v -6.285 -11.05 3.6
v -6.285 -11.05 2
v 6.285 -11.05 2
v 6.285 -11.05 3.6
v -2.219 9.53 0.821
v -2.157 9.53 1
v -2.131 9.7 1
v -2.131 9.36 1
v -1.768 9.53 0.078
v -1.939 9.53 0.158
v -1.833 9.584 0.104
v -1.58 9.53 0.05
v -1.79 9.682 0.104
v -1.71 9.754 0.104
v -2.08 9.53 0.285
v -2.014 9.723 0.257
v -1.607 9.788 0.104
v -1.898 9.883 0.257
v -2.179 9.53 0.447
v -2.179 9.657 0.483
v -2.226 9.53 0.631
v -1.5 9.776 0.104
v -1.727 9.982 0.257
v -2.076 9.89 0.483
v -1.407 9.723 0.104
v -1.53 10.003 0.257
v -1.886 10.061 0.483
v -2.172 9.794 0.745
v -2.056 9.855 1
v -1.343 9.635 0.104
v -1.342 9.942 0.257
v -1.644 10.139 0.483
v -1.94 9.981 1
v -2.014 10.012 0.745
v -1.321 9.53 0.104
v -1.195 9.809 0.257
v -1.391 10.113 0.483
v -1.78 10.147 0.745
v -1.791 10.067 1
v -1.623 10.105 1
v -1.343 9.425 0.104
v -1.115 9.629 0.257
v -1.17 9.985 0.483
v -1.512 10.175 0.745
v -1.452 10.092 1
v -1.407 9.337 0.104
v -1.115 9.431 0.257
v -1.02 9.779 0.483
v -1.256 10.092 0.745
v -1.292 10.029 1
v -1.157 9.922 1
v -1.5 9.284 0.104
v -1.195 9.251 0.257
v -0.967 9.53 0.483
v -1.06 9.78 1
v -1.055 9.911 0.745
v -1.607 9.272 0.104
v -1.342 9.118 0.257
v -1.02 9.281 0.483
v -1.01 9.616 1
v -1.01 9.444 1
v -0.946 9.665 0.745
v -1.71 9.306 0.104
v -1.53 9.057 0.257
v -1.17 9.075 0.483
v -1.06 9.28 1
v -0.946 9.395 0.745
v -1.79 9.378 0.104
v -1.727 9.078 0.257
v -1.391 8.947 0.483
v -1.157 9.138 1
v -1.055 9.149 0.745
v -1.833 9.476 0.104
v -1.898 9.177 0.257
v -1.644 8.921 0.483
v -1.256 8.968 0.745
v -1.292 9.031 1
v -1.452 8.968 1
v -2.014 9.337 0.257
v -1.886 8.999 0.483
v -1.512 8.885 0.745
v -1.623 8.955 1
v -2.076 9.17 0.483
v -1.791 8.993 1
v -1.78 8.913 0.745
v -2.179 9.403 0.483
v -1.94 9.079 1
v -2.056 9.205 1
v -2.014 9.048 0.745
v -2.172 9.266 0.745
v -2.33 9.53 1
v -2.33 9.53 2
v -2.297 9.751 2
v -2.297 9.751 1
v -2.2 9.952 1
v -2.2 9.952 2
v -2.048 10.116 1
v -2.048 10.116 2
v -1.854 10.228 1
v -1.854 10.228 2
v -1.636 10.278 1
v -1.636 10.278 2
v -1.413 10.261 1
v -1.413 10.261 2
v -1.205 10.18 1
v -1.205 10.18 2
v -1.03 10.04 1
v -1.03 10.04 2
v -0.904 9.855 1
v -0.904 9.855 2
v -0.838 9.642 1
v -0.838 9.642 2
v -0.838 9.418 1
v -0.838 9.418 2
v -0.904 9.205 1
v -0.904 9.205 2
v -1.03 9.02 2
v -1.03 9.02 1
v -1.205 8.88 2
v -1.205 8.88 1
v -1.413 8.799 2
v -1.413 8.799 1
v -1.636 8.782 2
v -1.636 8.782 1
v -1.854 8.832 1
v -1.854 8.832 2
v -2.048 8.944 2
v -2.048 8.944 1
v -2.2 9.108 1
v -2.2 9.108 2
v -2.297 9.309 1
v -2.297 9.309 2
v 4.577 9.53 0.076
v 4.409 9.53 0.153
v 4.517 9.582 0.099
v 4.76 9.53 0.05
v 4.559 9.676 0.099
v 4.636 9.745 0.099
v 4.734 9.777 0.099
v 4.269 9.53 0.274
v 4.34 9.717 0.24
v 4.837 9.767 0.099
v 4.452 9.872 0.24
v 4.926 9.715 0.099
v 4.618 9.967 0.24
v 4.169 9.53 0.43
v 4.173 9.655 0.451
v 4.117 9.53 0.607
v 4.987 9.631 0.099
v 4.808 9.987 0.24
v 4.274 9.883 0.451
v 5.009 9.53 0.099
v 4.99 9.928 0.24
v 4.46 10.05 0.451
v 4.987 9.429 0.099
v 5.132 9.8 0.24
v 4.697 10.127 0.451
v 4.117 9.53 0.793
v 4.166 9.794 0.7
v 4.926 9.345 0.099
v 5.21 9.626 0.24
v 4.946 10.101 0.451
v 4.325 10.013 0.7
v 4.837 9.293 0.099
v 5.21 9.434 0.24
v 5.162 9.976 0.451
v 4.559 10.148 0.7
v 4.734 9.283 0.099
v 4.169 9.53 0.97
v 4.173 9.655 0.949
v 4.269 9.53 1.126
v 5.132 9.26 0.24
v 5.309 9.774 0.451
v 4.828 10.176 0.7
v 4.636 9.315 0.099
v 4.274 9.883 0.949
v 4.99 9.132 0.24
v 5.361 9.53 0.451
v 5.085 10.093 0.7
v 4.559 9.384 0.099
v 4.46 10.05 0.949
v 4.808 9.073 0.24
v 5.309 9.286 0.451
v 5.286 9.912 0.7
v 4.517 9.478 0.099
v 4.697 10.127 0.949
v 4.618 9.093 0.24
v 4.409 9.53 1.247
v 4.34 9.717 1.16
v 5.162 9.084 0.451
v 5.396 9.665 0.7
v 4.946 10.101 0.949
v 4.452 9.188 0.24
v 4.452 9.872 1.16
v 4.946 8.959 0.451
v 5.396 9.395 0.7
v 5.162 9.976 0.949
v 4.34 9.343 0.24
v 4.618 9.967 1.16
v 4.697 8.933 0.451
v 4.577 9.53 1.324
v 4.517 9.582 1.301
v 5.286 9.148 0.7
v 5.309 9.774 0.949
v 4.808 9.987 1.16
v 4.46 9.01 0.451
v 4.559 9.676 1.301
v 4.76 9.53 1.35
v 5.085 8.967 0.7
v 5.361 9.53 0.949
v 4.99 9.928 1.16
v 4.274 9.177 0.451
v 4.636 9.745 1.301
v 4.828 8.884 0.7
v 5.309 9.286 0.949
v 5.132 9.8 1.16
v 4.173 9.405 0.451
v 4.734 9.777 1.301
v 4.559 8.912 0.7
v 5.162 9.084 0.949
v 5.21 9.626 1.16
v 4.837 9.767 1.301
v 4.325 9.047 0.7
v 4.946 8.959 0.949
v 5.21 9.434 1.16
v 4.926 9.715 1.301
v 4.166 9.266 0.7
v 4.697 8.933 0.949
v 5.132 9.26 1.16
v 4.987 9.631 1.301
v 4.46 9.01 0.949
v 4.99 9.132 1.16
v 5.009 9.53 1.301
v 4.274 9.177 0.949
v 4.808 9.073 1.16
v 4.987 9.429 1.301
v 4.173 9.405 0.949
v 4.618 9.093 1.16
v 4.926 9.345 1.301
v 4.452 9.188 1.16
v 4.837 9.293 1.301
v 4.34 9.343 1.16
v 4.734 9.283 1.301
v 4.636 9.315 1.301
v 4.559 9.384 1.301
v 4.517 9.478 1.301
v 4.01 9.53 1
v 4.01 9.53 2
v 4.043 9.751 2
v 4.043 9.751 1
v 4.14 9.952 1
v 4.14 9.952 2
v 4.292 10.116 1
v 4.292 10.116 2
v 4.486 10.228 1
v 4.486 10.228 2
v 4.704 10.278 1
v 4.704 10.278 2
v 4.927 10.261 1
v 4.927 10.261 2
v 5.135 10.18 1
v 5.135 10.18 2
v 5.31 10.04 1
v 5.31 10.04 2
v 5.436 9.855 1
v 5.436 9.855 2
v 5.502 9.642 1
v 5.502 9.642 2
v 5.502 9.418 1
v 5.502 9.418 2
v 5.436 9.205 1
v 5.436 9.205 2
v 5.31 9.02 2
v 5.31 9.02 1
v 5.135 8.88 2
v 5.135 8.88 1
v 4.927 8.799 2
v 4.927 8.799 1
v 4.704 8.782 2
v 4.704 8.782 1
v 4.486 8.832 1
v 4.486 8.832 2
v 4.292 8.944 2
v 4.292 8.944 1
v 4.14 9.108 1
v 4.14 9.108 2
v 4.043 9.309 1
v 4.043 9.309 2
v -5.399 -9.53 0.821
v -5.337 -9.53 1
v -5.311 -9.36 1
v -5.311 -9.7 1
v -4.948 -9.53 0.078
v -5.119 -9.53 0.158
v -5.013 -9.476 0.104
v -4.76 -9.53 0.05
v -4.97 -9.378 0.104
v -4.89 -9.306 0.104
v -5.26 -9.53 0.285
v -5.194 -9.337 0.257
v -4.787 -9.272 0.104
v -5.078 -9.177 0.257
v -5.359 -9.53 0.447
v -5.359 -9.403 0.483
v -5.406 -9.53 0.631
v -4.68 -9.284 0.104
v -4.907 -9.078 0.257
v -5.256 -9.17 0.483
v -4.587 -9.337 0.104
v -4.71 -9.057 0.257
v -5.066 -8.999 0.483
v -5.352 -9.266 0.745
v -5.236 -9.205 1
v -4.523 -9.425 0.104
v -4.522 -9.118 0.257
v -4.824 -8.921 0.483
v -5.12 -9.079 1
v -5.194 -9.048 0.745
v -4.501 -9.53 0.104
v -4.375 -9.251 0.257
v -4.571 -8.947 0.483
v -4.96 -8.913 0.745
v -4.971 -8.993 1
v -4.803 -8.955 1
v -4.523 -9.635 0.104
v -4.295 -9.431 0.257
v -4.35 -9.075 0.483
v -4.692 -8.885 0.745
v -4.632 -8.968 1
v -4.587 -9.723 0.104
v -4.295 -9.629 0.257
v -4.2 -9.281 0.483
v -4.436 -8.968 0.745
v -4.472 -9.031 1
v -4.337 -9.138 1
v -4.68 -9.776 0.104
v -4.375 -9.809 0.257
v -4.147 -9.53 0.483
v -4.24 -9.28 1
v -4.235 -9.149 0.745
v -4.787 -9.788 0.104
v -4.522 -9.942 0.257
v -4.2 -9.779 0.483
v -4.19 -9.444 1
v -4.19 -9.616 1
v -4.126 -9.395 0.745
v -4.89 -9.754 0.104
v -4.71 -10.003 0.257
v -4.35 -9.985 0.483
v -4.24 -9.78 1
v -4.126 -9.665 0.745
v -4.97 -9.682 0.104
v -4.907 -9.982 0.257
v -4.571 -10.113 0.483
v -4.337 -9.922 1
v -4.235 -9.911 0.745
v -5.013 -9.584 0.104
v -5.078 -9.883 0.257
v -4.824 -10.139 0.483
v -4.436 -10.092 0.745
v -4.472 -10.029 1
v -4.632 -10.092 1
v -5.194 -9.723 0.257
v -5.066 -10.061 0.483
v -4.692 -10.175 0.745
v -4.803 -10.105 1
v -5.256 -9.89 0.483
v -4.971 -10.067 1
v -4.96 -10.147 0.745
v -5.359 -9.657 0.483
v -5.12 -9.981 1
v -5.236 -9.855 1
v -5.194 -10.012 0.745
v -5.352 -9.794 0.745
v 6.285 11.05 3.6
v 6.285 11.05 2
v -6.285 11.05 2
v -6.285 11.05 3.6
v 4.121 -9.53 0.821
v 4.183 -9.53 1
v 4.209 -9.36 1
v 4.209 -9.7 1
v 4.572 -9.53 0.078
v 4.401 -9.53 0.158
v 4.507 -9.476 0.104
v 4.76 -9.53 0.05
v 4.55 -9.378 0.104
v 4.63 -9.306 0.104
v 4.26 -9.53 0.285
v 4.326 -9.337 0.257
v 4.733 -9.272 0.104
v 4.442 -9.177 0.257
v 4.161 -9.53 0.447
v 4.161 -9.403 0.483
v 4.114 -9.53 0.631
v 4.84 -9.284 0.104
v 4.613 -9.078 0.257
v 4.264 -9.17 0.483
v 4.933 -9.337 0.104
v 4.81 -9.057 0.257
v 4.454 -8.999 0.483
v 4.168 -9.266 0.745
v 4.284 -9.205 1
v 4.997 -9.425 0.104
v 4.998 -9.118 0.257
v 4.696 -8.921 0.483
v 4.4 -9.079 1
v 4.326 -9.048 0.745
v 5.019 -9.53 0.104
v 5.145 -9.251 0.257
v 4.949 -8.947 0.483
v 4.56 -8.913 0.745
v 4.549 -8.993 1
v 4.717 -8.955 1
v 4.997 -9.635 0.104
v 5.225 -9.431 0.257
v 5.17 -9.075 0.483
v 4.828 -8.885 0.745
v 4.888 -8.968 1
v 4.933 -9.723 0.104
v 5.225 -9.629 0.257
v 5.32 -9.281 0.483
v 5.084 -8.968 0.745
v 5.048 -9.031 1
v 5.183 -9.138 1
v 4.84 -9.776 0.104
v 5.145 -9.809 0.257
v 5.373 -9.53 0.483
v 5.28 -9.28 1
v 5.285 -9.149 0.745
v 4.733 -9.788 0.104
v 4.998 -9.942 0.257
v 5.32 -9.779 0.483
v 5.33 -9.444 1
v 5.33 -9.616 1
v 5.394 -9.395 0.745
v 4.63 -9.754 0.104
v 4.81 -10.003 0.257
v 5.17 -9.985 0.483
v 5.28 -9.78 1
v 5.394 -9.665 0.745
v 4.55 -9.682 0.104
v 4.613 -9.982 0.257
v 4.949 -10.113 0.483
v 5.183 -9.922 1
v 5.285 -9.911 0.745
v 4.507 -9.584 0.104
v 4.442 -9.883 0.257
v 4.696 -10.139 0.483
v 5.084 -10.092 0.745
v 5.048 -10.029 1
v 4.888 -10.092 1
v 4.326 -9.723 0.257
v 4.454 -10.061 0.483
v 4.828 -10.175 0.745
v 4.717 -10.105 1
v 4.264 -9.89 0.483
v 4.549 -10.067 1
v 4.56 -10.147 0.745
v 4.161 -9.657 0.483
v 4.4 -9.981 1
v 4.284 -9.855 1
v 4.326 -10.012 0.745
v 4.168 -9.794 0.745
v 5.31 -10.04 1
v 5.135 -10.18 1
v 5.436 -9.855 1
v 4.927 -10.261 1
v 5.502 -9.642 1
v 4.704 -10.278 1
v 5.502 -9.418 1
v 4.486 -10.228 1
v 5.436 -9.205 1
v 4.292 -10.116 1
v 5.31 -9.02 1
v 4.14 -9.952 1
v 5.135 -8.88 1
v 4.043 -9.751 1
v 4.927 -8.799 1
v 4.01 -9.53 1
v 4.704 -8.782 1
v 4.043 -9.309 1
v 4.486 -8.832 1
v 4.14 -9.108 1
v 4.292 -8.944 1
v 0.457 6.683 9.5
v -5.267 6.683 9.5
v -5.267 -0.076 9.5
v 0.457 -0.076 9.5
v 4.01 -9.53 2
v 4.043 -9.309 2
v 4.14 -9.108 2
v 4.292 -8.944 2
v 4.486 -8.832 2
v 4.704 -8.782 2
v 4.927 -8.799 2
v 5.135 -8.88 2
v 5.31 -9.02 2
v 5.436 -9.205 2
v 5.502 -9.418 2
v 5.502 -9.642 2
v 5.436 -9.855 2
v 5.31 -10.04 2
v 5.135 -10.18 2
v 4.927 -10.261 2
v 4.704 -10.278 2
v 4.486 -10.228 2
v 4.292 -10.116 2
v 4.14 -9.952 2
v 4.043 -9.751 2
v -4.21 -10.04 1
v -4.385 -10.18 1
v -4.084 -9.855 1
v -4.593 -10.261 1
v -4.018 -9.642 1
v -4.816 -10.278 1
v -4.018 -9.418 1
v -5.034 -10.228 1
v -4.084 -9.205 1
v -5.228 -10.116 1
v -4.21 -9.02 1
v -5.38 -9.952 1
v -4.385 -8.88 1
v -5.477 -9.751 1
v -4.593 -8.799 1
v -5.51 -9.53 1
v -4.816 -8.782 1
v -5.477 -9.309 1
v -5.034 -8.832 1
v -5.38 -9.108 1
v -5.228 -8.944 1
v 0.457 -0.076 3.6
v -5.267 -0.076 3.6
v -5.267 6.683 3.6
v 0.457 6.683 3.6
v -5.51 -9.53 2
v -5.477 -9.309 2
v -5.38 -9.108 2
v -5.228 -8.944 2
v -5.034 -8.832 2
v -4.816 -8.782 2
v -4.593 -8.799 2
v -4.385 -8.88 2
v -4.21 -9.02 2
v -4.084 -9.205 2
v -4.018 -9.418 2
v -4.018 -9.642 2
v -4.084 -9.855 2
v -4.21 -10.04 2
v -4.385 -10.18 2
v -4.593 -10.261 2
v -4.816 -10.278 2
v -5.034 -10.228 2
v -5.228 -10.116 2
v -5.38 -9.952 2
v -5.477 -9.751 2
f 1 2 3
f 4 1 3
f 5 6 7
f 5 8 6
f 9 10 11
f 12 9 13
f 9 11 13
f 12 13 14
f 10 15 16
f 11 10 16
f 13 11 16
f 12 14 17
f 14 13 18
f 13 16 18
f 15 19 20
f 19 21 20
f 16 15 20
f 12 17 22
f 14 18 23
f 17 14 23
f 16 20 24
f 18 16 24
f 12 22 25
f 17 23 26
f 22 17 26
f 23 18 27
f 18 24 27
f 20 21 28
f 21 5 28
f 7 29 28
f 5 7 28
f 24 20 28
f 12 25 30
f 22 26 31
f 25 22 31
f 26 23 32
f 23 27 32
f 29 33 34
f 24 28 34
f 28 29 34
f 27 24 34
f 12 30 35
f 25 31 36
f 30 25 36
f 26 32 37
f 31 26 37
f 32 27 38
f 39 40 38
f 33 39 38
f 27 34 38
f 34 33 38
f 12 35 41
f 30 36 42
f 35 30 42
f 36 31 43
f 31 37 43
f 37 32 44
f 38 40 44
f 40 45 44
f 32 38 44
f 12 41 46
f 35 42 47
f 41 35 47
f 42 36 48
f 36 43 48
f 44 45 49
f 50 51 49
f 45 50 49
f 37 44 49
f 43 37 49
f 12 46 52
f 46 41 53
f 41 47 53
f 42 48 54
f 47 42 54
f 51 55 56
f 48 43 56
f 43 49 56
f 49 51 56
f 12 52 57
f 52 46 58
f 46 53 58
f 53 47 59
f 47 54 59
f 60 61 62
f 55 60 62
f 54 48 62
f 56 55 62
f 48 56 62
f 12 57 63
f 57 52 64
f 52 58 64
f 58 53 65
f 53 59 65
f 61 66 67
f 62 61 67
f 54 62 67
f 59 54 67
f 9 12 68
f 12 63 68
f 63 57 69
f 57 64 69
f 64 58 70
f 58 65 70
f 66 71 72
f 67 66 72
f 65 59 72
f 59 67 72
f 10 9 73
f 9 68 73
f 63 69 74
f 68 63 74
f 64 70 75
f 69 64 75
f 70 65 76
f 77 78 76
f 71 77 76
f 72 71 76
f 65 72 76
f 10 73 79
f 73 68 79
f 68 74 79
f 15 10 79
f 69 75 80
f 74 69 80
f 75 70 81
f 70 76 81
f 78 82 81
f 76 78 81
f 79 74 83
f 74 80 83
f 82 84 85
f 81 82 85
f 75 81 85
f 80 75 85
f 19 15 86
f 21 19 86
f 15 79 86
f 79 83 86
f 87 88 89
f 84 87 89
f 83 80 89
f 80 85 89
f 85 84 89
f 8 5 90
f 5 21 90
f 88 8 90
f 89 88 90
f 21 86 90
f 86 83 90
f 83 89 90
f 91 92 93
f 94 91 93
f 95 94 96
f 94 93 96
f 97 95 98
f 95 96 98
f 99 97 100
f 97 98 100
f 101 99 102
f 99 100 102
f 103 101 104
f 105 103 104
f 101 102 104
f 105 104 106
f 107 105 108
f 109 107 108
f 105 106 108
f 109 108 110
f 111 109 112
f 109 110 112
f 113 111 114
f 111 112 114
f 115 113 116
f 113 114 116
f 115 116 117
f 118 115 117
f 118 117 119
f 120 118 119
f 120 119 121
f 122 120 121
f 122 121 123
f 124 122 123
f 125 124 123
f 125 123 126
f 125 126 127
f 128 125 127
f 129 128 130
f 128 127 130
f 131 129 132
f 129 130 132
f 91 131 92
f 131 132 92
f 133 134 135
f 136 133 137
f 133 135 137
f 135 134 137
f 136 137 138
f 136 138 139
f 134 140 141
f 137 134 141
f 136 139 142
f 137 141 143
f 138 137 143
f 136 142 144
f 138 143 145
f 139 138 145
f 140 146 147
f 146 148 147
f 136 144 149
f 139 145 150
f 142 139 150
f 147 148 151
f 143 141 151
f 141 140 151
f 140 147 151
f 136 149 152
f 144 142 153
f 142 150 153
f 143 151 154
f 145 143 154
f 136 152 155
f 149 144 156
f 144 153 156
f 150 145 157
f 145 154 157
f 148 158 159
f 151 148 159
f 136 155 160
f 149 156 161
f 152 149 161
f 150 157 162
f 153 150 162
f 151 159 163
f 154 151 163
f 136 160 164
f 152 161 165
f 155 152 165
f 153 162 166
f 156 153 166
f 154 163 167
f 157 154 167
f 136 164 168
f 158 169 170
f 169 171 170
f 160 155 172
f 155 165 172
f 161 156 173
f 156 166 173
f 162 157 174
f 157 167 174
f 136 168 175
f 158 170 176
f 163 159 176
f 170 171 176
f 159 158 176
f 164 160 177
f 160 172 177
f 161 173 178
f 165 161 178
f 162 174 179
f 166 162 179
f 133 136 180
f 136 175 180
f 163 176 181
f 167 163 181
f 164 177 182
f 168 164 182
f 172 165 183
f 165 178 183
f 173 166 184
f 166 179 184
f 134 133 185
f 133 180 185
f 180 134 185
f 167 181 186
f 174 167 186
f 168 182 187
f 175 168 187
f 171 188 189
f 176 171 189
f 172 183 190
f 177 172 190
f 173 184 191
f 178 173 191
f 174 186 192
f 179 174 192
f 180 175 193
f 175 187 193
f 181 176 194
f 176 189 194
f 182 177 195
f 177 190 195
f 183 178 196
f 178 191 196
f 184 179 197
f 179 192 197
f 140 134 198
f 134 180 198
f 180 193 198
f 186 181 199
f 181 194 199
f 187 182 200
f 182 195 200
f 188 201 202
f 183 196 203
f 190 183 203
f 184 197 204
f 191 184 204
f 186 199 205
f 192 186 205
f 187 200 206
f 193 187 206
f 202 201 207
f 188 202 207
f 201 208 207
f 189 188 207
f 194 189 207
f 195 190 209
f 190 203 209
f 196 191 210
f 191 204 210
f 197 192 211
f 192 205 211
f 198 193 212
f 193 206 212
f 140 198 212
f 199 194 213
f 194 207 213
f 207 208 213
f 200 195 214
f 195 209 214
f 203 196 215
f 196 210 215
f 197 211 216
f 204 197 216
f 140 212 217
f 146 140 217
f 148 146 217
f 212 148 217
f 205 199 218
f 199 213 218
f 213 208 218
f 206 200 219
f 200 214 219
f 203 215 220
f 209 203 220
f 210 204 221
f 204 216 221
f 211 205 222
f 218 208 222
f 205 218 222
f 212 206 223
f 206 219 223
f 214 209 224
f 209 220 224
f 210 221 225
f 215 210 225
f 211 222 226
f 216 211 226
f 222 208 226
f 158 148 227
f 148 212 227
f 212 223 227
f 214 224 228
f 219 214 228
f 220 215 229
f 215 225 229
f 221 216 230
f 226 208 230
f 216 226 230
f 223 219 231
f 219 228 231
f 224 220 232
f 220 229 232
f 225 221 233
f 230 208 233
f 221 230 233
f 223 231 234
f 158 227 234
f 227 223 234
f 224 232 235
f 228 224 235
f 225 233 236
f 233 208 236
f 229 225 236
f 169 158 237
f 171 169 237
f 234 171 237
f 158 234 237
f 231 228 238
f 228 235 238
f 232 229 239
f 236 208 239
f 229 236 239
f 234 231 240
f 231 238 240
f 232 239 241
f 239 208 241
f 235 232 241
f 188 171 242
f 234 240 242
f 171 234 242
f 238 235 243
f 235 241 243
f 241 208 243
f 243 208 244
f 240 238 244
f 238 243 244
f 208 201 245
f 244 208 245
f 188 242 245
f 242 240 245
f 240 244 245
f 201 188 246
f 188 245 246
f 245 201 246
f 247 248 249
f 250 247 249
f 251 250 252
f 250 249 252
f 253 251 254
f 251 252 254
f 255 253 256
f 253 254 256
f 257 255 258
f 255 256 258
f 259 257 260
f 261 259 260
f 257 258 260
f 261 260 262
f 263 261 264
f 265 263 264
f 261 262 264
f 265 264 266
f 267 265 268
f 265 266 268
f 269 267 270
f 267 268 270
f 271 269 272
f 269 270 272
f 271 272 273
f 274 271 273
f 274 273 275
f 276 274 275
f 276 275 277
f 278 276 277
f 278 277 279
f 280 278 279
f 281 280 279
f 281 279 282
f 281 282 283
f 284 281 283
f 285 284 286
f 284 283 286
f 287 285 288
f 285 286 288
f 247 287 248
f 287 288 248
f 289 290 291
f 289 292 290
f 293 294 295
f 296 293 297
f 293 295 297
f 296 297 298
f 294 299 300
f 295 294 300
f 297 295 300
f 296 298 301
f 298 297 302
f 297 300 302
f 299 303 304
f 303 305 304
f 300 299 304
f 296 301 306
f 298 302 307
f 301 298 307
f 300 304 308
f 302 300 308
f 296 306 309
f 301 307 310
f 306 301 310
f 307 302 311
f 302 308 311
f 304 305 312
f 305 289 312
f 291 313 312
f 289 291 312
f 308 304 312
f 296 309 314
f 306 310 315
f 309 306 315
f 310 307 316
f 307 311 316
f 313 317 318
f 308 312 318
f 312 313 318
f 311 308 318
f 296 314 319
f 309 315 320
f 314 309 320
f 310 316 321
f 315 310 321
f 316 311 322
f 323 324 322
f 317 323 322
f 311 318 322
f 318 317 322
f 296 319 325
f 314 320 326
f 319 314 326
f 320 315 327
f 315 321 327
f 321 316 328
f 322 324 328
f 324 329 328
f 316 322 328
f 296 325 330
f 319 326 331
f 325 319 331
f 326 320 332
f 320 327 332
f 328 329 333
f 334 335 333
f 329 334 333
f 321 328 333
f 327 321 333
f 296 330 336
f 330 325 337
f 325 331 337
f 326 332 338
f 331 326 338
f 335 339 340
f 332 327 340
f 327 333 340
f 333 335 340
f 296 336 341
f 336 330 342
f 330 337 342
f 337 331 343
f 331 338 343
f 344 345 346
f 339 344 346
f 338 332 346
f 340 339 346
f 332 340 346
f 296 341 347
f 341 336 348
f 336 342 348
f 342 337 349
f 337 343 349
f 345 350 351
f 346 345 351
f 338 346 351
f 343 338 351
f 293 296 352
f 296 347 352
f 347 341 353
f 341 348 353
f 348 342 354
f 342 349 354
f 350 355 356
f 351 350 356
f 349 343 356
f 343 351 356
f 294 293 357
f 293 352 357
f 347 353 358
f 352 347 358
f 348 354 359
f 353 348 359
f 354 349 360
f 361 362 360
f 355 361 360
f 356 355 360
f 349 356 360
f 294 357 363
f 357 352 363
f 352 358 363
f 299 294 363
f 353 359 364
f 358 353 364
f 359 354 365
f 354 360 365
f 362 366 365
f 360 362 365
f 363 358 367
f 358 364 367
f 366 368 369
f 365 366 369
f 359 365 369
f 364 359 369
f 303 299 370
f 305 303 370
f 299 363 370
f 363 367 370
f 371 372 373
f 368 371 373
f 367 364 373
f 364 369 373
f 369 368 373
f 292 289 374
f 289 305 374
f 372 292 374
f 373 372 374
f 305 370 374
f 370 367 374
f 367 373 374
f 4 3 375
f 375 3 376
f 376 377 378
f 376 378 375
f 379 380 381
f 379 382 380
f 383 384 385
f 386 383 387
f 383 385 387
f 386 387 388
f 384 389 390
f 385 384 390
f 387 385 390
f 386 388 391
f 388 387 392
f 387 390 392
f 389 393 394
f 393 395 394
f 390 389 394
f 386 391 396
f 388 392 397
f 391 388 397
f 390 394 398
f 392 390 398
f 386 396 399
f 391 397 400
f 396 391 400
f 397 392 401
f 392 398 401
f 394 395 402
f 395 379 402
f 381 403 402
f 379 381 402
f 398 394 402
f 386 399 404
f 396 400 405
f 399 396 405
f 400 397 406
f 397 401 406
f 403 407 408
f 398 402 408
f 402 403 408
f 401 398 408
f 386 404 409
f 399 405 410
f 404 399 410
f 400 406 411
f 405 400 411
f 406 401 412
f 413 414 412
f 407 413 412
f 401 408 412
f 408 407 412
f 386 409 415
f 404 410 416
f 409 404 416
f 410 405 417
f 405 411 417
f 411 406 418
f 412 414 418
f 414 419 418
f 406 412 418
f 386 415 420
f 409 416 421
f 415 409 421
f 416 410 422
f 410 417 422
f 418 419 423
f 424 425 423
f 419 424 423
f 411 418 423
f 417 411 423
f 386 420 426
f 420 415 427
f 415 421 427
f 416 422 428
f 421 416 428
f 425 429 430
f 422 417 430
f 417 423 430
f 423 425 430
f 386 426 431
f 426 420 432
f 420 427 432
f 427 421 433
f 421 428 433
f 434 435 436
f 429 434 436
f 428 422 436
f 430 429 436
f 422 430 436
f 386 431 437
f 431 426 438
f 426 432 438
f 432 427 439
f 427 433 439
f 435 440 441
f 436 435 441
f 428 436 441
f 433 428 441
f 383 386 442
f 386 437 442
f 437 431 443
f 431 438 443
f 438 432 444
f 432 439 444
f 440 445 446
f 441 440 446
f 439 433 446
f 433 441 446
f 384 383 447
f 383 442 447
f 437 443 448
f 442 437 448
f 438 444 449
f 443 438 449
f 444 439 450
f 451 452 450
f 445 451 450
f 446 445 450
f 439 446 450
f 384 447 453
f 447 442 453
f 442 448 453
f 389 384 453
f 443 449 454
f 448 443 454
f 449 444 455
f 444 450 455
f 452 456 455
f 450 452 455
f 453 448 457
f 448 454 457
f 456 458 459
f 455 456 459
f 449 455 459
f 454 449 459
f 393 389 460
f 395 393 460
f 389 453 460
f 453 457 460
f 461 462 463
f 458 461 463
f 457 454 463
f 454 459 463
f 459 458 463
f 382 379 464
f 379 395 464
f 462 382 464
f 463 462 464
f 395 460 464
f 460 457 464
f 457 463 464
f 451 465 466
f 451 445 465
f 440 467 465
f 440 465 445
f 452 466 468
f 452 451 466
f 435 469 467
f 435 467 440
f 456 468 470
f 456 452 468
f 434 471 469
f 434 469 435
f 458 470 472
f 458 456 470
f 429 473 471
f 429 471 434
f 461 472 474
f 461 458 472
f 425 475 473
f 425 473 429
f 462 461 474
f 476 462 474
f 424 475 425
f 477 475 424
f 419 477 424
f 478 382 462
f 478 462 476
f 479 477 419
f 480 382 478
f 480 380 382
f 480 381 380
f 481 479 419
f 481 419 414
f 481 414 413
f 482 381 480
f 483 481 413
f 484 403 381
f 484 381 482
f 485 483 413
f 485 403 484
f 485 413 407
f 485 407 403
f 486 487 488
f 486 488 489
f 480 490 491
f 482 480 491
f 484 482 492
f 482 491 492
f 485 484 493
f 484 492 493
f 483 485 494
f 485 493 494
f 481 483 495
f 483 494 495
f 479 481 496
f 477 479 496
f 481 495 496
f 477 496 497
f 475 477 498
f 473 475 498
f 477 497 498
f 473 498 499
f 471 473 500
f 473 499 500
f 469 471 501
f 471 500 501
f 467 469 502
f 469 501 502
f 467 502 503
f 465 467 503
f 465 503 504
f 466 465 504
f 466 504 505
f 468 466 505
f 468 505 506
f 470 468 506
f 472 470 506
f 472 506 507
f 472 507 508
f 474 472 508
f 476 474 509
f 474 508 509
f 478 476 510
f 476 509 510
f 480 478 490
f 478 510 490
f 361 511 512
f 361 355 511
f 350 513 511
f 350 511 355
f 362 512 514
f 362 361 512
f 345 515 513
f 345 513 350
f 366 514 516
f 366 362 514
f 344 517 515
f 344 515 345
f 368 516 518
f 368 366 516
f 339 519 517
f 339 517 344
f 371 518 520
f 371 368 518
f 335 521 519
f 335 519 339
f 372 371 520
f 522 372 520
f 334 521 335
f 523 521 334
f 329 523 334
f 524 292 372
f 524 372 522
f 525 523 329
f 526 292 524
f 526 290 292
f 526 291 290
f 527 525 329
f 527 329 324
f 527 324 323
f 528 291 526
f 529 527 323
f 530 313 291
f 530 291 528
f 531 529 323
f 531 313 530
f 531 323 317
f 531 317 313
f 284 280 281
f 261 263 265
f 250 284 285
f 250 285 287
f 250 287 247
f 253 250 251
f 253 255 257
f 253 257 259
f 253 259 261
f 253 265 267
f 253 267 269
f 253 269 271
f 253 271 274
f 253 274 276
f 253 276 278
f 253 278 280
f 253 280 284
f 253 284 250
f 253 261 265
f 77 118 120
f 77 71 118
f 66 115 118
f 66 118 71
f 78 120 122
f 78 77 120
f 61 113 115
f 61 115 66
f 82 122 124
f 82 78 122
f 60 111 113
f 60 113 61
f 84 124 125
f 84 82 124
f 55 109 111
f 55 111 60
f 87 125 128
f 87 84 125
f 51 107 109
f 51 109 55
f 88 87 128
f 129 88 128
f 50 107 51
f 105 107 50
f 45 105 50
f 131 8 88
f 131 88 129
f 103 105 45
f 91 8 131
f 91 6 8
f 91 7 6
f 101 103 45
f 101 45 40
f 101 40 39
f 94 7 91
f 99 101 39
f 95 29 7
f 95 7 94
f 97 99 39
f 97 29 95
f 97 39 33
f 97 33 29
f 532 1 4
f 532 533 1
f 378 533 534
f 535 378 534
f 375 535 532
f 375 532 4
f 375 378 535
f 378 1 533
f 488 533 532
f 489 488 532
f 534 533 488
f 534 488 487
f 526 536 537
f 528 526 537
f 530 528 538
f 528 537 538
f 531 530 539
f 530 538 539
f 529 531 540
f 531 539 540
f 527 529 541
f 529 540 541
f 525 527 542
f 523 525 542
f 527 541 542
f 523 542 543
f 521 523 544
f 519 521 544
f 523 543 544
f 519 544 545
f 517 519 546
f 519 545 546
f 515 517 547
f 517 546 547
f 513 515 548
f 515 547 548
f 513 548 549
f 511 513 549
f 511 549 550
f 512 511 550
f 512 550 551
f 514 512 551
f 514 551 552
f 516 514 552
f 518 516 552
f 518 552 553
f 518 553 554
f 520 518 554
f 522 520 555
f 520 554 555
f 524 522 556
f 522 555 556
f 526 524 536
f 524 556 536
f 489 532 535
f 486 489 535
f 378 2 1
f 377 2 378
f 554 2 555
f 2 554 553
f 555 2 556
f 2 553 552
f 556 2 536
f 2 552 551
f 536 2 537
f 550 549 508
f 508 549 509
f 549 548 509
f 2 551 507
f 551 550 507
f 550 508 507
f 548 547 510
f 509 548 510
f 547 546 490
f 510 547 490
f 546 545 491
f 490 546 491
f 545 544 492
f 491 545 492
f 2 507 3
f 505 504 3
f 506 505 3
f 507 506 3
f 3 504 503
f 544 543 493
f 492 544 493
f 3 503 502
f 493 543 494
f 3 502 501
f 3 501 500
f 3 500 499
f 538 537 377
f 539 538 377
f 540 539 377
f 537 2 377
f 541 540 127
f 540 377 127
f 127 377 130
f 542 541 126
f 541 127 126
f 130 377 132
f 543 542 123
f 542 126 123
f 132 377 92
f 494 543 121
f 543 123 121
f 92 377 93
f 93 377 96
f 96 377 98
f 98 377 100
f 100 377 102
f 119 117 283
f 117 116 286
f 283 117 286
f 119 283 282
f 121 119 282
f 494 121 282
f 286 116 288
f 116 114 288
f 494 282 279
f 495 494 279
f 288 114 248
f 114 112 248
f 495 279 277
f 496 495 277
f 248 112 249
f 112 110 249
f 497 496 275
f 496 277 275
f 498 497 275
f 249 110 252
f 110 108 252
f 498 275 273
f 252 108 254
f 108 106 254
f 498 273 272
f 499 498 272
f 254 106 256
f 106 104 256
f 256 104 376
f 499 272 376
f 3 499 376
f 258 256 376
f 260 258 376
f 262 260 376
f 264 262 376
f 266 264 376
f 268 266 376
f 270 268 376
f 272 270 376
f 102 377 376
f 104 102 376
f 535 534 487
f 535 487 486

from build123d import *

# Parameters (mm, degrees)
BOSS_EXTRUDE1_START = 2
SKETCH1_W           = 12.57
SKETCH1_H           = 22.1
BOSS_EXTRUDE1_DEPTH = 1.6
SKETCH2_W           = 5.723607812
SKETCH2_H           = 6.758728373
BOSS_EXTRUDE2_DEPTH = 5.9
SKETCH3_R           = 0.75
BOSS_EXTRUDE3_DEPTH = 1


with BuildPart() as part:
    # Sketch1 → Boss-Extrude1 (new body)
    with BuildSketch(Plane.XY.offset(BOSS_EXTRUDE1_START)):
        Rectangle(SKETCH1_W, SKETCH1_H)
    extrude(amount=BOSS_EXTRUDE1_DEPTH)

    # Sketch2 → Boss-Extrude2 (add)
    with BuildSketch(Plane.XY.offset(3.6)):
        with Locations((-2.40513307, 3.303252381)):
            Rectangle(SKETCH2_W, SKETCH2_H)
    extrude(amount=BOSS_EXTRUDE2_DEPTH)

    # Sketch3 → Boss-Extrude3 (add)
    with BuildSketch(Plane(origin=(0, 0, 2), x_dir=(-1, 0, 0), z_dir=(0, 0, -1))):
        with Locations((-4.76, 9.53)):
            Circle(SKETCH3_R)
        with Locations((-4.76, -9.53)):
            Circle(SKETCH3_R)
        with Locations((4.76, -9.53)):
            Circle(SKETCH3_R)
        with Locations((1.58, 9.53)):
            Circle(SKETCH3_R)
    extrude(amount=BOSS_EXTRUDE3_DEPTH)


with BuildPart() as body_2:
    # Sketch4 → Revolve1 (revolve)
    with BuildSketch(Plane(origin=(0, 9.53, 0), x_dir=(1, 0, 0), z_dir=(0, 1, 0))):
        with BuildLine():
            Line((4.76, -1.35), (4.76, -0.05))
            ThreePointArc((4.76, -0.05), (4.11, -0.7), (4.76, -1.35))
        make_face()
    revolve1 = revolve(axis=Axis((4.76, 9.53, 1.35), (0, 0, -1)))


with BuildPart() as part_1:
    add(part.part)

    # Sketch-Pattern2: Revolve1 at 3 more places
    with Locations((-6.34, 0, 0), (0, -19.06, 0), (-9.52, -19.06, 0)):
        add(revolve1)


solid = Compound([body_2.part, part_1.part])
